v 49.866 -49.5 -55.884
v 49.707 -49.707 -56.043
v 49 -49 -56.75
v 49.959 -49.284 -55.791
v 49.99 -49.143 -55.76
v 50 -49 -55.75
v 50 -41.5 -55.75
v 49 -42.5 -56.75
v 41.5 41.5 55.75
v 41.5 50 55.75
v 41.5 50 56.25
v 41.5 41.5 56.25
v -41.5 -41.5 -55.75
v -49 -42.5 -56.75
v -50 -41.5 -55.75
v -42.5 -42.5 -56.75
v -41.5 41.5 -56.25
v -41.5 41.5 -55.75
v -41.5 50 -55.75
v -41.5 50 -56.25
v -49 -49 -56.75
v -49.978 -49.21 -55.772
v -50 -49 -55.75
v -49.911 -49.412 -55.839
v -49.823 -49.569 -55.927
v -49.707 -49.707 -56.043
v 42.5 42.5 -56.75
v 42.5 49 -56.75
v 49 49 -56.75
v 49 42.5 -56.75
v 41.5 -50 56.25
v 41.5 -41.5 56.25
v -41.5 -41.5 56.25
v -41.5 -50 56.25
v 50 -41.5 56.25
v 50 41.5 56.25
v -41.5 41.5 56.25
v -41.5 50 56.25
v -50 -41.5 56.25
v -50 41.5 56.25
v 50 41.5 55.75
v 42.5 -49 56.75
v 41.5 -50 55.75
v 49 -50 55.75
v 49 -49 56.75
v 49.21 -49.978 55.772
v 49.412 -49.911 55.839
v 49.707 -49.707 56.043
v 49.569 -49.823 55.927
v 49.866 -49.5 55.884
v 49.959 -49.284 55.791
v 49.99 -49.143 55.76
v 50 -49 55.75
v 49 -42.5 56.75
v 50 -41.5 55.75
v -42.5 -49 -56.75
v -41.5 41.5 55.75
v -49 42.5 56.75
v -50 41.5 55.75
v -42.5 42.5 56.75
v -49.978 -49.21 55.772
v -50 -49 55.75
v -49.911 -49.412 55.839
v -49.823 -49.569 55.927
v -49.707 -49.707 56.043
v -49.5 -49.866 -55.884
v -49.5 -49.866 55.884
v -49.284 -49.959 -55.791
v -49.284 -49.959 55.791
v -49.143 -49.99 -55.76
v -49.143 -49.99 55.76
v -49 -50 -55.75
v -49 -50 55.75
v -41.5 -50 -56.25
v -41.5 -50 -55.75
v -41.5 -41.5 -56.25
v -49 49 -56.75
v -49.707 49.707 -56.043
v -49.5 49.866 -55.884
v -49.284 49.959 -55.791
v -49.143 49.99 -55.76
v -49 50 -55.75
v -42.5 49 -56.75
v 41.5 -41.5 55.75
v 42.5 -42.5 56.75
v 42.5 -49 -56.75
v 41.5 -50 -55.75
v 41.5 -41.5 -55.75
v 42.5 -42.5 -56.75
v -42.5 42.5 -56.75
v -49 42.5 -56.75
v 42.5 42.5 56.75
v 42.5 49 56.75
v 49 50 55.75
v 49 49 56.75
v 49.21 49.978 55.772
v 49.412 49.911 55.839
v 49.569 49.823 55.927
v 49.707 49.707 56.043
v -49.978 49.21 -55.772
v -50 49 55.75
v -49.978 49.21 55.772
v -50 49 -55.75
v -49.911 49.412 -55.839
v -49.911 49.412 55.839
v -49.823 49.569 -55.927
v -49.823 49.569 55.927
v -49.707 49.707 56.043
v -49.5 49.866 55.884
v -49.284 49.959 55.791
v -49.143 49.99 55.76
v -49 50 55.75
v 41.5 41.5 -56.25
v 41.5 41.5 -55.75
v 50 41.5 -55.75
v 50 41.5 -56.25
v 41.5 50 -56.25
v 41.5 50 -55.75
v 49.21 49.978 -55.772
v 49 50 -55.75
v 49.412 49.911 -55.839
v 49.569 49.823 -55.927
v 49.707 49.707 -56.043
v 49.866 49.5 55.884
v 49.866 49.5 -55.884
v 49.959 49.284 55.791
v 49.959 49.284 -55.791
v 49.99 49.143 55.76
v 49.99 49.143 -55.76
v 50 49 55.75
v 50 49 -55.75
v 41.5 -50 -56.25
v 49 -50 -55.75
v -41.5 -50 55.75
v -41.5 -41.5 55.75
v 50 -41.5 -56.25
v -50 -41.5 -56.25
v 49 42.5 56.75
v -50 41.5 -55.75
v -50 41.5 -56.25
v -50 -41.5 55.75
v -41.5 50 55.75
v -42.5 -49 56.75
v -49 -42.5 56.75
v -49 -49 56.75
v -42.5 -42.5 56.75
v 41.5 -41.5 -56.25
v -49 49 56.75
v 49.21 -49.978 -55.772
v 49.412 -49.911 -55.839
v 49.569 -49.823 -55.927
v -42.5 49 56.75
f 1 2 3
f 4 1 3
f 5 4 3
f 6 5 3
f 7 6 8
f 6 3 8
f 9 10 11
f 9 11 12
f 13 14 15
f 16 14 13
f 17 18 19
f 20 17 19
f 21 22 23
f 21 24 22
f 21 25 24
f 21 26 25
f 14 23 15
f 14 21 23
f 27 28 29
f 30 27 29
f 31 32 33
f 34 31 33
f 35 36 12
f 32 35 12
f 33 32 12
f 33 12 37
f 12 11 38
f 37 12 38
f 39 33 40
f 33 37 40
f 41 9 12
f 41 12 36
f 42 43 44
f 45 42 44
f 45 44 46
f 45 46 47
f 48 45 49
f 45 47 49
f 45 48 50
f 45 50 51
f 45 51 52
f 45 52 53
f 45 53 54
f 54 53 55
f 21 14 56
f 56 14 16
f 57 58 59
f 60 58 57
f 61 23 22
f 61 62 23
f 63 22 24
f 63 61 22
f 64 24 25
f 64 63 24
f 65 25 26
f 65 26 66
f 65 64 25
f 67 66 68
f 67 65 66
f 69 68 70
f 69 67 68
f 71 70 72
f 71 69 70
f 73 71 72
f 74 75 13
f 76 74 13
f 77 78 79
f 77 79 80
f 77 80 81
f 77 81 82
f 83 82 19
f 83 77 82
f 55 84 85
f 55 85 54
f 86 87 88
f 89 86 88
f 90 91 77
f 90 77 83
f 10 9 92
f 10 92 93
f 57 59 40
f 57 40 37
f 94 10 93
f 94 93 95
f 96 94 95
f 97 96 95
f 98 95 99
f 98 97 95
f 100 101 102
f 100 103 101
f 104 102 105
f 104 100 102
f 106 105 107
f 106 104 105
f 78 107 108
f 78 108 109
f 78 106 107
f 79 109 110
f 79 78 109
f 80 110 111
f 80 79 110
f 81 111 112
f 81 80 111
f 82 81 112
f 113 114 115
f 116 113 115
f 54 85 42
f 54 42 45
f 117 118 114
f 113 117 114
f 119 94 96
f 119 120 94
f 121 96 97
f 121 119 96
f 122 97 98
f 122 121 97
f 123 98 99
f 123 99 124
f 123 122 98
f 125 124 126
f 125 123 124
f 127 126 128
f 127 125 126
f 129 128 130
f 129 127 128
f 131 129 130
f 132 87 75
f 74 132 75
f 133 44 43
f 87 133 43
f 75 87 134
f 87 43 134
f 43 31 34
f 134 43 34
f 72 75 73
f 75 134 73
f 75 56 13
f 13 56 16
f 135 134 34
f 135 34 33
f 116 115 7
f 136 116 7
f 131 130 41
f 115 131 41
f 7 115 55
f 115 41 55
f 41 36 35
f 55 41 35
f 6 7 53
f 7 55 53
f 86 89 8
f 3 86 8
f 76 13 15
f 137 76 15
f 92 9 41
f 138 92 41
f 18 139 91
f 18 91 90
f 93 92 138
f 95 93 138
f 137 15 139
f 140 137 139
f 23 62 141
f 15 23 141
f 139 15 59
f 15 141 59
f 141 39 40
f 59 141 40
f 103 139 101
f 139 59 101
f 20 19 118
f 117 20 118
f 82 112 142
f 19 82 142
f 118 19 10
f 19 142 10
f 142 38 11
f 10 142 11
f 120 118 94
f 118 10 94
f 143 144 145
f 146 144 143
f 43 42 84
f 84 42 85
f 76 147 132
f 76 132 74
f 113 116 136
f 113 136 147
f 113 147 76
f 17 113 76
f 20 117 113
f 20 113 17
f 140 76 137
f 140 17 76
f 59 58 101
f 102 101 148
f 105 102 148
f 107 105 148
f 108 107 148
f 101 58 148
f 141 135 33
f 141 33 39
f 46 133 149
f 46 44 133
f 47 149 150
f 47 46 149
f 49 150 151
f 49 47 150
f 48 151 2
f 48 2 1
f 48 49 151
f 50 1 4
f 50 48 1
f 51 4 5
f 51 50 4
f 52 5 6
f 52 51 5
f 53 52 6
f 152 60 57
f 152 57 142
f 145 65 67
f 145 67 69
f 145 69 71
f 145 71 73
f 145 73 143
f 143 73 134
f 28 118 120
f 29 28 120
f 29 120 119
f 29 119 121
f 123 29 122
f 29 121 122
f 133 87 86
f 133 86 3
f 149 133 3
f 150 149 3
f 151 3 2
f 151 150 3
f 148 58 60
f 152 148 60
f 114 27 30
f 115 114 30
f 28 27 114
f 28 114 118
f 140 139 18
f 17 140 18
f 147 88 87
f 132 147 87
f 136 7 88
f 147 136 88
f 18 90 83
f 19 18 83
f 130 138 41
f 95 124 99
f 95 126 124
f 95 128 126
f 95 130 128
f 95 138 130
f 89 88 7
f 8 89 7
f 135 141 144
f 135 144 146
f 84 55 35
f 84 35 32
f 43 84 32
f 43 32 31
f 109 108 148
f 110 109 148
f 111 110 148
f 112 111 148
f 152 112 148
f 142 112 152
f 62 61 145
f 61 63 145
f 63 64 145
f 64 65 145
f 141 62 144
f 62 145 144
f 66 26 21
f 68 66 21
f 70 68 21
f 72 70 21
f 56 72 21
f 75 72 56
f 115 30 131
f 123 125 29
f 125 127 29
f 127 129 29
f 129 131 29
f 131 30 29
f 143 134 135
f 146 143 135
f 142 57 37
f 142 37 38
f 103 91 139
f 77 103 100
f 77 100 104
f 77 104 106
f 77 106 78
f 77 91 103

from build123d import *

# Parameters (mm, degrees)
BOSS_EXTRUDE1_DEPTH        = 56.75
BOSS_EXTRUDE1_DEPTH_BACK   = 56.75
SKETCH1_W                  = 8.5
SKETCH1_H                  = 8.5
BOSS_EXTRUDE1_2_DEPTH      = 56.75
BOSS_EXTRUDE1_2_DEPTH_BACK = 56.75
BOSS_EXTRUDE1_3_DEPTH      = 56.75
BOSS_EXTRUDE1_3_DEPTH_BACK = 56.75
BOSS_EXTRUDE1_4_DEPTH      = 56.75
BOSS_EXTRUDE1_4_DEPTH_BACK = 56.75
BOSS_EXTRUDE2_DEPTH        = 50.25
BOSS_EXTRUDE2_DEPTH_BACK   = 50.25
SKETCH2_W                  = 100
SKETCH2_H                  = 100
CHAMFER2_SIZE              = 1
FILLET1_R                  = 1
BOSS_EXTRUDE3_DEPTH        = 6


with BuildPart() as part:
    # Sketch1 → Boss-Extrude1 (new, two sides: drawn at the far end of the back side and taken through both)
    with BuildSketch(Plane.XY.offset(-BOSS_EXTRUDE1_DEPTH_BACK)):
        with Locations((-45.75, 45.75)):
            Rectangle(SKETCH1_W, SKETCH1_H)
    extrude(amount=BOSS_EXTRUDE1_DEPTH + BOSS_EXTRUDE1_DEPTH_BACK)



with BuildPart() as body_2:
    # Sketch1 → Boss-Extrude1 2 (new, two sides: drawn at the far end of the back side and taken through both)
    with BuildSketch(Plane.XY.offset(-BOSS_EXTRUDE1_2_DEPTH_BACK)):
        with Locations((45.75, 45.75)):
            Rectangle(SKETCH1_W, SKETCH1_H)
    extrude(amount=BOSS_EXTRUDE1_2_DEPTH + BOSS_EXTRUDE1_2_DEPTH_BACK)


with BuildPart() as body_3:
    # Sketch1 → Boss-Extrude1 3 (new, two sides: drawn at the far end of the back side and taken through both)
    with BuildSketch(Plane.XY.offset(-BOSS_EXTRUDE1_3_DEPTH_BACK)):
        with Locations((45.75, -45.75)):
            Rectangle(SKETCH1_W, SKETCH1_H)
    extrude(amount=BOSS_EXTRUDE1_3_DEPTH + BOSS_EXTRUDE1_3_DEPTH_BACK)


with BuildPart() as body_4:
    # Sketch1 → Boss-Extrude1 4 (new, two sides: drawn at the far end of the back side and taken through both)
    with BuildSketch(Plane.XY.offset(-BOSS_EXTRUDE1_4_DEPTH_BACK)):
        with Locations((-45.75, -45.75)):
            Rectangle(SKETCH1_W, SKETCH1_H)
    extrude(amount=BOSS_EXTRUDE1_4_DEPTH + BOSS_EXTRUDE1_4_DEPTH_BACK)


with BuildPart() as part_1:
    add(part.part)

    add(body_2.part)  # Boss-Extrude2 merges body 2

    add(body_3.part)  # Boss-Extrude2 merges body 3

    add(body_4.part)  # Boss-Extrude2 merges body 4
    # Sketch2 → Boss-Extrude2 (add, two sides: drawn at the far end of the back side and taken through both)
    with BuildSketch(Plane.XY.offset(-BOSS_EXTRUDE2_DEPTH_BACK)):
        Rectangle(SKETCH2_W, SKETCH2_H)
    extrude(amount=BOSS_EXTRUDE2_DEPTH + BOSS_EXTRUDE2_DEPTH_BACK)

    # Chamfer2
    chamfer2_edges = [part_1.edges().sort_by_distance(p)[0] for p in [
        (-45.75, -41.5, 56.75),
        (-41.5, -45.75, 56.75),
        (-45.75, -50, 56.75),
        (-50, -45.75, 56.75),
        (41.5, -45.75, 56.75),
        (45.75, -41.5, 56.75),
        (50, -45.75, 56.75),
        (45.75, -50, 56.75),
        (45.75, 41.5, 56.75),
        (41.5, 45.75, 56.75),
        (45.75, 50, 56.75),
        (50, 45.75, 56.75),
        (-41.5, 45.75, 56.75),
        (-45.75, 41.5, 56.75),
        (-50, 45.75, 56.75),
        (-45.75, 50, 56.75),
        (41.5, 45.75, -56.75),
        (45.75, 41.5, -56.75),
        (50, 45.75, -56.75),
        (45.75, 50, -56.75),
        (-45.75, 41.5, -56.75),
        (-41.5, 45.75, -56.75),
        (-45.75, 50, -56.75),
        (-50, 45.75, -56.75),
        (-41.5, -45.75, -56.75),
        (-45.75, -41.5, -56.75),
        (-50, -45.75, -56.75),
        (-45.75, -50, -56.75),
        (45.75, -41.5, -56.75),
        (41.5, -45.75, -56.75),
        (45.75, -50, -56.75),
        (50, -45.75, -56.75),
    ]]
    chamfer(chamfer2_edges, length=CHAMFER2_SIZE)

    # Fillet1
    fillet1_edges = [part_1.edges().sort_by_distance(p)[0] for p in [
        (50, -50, 0),
        (-50, -50, 0),
        (-50, 50, 0),
        (50, 50, 0),
    ]]
    fillet(fillet1_edges, radius=FILLET1_R)

    # Sketch3 → Boss-Extrude3 (add)
    with BuildSketch(Plane.XY.offset(50.25)):
        Polygon((-41.5, 50), (41.5, 50), (41.5, 41.5), (50, 41.5), (50, -41.5), (41.5, -41.5), (41.5, -50), (-41.5, -50), (-41.5, -41.5), (-50, -41.5), (-50, 41.5), (-41.5, 41.5), align=None)
    boss_extrude3 = extrude(amount=BOSS_EXTRUDE3_DEPTH)

    # Mirror1: Boss-Extrude3 across plane
    add(boss_extrude3.mirror(Plane.XY))


solid = part_1.part
